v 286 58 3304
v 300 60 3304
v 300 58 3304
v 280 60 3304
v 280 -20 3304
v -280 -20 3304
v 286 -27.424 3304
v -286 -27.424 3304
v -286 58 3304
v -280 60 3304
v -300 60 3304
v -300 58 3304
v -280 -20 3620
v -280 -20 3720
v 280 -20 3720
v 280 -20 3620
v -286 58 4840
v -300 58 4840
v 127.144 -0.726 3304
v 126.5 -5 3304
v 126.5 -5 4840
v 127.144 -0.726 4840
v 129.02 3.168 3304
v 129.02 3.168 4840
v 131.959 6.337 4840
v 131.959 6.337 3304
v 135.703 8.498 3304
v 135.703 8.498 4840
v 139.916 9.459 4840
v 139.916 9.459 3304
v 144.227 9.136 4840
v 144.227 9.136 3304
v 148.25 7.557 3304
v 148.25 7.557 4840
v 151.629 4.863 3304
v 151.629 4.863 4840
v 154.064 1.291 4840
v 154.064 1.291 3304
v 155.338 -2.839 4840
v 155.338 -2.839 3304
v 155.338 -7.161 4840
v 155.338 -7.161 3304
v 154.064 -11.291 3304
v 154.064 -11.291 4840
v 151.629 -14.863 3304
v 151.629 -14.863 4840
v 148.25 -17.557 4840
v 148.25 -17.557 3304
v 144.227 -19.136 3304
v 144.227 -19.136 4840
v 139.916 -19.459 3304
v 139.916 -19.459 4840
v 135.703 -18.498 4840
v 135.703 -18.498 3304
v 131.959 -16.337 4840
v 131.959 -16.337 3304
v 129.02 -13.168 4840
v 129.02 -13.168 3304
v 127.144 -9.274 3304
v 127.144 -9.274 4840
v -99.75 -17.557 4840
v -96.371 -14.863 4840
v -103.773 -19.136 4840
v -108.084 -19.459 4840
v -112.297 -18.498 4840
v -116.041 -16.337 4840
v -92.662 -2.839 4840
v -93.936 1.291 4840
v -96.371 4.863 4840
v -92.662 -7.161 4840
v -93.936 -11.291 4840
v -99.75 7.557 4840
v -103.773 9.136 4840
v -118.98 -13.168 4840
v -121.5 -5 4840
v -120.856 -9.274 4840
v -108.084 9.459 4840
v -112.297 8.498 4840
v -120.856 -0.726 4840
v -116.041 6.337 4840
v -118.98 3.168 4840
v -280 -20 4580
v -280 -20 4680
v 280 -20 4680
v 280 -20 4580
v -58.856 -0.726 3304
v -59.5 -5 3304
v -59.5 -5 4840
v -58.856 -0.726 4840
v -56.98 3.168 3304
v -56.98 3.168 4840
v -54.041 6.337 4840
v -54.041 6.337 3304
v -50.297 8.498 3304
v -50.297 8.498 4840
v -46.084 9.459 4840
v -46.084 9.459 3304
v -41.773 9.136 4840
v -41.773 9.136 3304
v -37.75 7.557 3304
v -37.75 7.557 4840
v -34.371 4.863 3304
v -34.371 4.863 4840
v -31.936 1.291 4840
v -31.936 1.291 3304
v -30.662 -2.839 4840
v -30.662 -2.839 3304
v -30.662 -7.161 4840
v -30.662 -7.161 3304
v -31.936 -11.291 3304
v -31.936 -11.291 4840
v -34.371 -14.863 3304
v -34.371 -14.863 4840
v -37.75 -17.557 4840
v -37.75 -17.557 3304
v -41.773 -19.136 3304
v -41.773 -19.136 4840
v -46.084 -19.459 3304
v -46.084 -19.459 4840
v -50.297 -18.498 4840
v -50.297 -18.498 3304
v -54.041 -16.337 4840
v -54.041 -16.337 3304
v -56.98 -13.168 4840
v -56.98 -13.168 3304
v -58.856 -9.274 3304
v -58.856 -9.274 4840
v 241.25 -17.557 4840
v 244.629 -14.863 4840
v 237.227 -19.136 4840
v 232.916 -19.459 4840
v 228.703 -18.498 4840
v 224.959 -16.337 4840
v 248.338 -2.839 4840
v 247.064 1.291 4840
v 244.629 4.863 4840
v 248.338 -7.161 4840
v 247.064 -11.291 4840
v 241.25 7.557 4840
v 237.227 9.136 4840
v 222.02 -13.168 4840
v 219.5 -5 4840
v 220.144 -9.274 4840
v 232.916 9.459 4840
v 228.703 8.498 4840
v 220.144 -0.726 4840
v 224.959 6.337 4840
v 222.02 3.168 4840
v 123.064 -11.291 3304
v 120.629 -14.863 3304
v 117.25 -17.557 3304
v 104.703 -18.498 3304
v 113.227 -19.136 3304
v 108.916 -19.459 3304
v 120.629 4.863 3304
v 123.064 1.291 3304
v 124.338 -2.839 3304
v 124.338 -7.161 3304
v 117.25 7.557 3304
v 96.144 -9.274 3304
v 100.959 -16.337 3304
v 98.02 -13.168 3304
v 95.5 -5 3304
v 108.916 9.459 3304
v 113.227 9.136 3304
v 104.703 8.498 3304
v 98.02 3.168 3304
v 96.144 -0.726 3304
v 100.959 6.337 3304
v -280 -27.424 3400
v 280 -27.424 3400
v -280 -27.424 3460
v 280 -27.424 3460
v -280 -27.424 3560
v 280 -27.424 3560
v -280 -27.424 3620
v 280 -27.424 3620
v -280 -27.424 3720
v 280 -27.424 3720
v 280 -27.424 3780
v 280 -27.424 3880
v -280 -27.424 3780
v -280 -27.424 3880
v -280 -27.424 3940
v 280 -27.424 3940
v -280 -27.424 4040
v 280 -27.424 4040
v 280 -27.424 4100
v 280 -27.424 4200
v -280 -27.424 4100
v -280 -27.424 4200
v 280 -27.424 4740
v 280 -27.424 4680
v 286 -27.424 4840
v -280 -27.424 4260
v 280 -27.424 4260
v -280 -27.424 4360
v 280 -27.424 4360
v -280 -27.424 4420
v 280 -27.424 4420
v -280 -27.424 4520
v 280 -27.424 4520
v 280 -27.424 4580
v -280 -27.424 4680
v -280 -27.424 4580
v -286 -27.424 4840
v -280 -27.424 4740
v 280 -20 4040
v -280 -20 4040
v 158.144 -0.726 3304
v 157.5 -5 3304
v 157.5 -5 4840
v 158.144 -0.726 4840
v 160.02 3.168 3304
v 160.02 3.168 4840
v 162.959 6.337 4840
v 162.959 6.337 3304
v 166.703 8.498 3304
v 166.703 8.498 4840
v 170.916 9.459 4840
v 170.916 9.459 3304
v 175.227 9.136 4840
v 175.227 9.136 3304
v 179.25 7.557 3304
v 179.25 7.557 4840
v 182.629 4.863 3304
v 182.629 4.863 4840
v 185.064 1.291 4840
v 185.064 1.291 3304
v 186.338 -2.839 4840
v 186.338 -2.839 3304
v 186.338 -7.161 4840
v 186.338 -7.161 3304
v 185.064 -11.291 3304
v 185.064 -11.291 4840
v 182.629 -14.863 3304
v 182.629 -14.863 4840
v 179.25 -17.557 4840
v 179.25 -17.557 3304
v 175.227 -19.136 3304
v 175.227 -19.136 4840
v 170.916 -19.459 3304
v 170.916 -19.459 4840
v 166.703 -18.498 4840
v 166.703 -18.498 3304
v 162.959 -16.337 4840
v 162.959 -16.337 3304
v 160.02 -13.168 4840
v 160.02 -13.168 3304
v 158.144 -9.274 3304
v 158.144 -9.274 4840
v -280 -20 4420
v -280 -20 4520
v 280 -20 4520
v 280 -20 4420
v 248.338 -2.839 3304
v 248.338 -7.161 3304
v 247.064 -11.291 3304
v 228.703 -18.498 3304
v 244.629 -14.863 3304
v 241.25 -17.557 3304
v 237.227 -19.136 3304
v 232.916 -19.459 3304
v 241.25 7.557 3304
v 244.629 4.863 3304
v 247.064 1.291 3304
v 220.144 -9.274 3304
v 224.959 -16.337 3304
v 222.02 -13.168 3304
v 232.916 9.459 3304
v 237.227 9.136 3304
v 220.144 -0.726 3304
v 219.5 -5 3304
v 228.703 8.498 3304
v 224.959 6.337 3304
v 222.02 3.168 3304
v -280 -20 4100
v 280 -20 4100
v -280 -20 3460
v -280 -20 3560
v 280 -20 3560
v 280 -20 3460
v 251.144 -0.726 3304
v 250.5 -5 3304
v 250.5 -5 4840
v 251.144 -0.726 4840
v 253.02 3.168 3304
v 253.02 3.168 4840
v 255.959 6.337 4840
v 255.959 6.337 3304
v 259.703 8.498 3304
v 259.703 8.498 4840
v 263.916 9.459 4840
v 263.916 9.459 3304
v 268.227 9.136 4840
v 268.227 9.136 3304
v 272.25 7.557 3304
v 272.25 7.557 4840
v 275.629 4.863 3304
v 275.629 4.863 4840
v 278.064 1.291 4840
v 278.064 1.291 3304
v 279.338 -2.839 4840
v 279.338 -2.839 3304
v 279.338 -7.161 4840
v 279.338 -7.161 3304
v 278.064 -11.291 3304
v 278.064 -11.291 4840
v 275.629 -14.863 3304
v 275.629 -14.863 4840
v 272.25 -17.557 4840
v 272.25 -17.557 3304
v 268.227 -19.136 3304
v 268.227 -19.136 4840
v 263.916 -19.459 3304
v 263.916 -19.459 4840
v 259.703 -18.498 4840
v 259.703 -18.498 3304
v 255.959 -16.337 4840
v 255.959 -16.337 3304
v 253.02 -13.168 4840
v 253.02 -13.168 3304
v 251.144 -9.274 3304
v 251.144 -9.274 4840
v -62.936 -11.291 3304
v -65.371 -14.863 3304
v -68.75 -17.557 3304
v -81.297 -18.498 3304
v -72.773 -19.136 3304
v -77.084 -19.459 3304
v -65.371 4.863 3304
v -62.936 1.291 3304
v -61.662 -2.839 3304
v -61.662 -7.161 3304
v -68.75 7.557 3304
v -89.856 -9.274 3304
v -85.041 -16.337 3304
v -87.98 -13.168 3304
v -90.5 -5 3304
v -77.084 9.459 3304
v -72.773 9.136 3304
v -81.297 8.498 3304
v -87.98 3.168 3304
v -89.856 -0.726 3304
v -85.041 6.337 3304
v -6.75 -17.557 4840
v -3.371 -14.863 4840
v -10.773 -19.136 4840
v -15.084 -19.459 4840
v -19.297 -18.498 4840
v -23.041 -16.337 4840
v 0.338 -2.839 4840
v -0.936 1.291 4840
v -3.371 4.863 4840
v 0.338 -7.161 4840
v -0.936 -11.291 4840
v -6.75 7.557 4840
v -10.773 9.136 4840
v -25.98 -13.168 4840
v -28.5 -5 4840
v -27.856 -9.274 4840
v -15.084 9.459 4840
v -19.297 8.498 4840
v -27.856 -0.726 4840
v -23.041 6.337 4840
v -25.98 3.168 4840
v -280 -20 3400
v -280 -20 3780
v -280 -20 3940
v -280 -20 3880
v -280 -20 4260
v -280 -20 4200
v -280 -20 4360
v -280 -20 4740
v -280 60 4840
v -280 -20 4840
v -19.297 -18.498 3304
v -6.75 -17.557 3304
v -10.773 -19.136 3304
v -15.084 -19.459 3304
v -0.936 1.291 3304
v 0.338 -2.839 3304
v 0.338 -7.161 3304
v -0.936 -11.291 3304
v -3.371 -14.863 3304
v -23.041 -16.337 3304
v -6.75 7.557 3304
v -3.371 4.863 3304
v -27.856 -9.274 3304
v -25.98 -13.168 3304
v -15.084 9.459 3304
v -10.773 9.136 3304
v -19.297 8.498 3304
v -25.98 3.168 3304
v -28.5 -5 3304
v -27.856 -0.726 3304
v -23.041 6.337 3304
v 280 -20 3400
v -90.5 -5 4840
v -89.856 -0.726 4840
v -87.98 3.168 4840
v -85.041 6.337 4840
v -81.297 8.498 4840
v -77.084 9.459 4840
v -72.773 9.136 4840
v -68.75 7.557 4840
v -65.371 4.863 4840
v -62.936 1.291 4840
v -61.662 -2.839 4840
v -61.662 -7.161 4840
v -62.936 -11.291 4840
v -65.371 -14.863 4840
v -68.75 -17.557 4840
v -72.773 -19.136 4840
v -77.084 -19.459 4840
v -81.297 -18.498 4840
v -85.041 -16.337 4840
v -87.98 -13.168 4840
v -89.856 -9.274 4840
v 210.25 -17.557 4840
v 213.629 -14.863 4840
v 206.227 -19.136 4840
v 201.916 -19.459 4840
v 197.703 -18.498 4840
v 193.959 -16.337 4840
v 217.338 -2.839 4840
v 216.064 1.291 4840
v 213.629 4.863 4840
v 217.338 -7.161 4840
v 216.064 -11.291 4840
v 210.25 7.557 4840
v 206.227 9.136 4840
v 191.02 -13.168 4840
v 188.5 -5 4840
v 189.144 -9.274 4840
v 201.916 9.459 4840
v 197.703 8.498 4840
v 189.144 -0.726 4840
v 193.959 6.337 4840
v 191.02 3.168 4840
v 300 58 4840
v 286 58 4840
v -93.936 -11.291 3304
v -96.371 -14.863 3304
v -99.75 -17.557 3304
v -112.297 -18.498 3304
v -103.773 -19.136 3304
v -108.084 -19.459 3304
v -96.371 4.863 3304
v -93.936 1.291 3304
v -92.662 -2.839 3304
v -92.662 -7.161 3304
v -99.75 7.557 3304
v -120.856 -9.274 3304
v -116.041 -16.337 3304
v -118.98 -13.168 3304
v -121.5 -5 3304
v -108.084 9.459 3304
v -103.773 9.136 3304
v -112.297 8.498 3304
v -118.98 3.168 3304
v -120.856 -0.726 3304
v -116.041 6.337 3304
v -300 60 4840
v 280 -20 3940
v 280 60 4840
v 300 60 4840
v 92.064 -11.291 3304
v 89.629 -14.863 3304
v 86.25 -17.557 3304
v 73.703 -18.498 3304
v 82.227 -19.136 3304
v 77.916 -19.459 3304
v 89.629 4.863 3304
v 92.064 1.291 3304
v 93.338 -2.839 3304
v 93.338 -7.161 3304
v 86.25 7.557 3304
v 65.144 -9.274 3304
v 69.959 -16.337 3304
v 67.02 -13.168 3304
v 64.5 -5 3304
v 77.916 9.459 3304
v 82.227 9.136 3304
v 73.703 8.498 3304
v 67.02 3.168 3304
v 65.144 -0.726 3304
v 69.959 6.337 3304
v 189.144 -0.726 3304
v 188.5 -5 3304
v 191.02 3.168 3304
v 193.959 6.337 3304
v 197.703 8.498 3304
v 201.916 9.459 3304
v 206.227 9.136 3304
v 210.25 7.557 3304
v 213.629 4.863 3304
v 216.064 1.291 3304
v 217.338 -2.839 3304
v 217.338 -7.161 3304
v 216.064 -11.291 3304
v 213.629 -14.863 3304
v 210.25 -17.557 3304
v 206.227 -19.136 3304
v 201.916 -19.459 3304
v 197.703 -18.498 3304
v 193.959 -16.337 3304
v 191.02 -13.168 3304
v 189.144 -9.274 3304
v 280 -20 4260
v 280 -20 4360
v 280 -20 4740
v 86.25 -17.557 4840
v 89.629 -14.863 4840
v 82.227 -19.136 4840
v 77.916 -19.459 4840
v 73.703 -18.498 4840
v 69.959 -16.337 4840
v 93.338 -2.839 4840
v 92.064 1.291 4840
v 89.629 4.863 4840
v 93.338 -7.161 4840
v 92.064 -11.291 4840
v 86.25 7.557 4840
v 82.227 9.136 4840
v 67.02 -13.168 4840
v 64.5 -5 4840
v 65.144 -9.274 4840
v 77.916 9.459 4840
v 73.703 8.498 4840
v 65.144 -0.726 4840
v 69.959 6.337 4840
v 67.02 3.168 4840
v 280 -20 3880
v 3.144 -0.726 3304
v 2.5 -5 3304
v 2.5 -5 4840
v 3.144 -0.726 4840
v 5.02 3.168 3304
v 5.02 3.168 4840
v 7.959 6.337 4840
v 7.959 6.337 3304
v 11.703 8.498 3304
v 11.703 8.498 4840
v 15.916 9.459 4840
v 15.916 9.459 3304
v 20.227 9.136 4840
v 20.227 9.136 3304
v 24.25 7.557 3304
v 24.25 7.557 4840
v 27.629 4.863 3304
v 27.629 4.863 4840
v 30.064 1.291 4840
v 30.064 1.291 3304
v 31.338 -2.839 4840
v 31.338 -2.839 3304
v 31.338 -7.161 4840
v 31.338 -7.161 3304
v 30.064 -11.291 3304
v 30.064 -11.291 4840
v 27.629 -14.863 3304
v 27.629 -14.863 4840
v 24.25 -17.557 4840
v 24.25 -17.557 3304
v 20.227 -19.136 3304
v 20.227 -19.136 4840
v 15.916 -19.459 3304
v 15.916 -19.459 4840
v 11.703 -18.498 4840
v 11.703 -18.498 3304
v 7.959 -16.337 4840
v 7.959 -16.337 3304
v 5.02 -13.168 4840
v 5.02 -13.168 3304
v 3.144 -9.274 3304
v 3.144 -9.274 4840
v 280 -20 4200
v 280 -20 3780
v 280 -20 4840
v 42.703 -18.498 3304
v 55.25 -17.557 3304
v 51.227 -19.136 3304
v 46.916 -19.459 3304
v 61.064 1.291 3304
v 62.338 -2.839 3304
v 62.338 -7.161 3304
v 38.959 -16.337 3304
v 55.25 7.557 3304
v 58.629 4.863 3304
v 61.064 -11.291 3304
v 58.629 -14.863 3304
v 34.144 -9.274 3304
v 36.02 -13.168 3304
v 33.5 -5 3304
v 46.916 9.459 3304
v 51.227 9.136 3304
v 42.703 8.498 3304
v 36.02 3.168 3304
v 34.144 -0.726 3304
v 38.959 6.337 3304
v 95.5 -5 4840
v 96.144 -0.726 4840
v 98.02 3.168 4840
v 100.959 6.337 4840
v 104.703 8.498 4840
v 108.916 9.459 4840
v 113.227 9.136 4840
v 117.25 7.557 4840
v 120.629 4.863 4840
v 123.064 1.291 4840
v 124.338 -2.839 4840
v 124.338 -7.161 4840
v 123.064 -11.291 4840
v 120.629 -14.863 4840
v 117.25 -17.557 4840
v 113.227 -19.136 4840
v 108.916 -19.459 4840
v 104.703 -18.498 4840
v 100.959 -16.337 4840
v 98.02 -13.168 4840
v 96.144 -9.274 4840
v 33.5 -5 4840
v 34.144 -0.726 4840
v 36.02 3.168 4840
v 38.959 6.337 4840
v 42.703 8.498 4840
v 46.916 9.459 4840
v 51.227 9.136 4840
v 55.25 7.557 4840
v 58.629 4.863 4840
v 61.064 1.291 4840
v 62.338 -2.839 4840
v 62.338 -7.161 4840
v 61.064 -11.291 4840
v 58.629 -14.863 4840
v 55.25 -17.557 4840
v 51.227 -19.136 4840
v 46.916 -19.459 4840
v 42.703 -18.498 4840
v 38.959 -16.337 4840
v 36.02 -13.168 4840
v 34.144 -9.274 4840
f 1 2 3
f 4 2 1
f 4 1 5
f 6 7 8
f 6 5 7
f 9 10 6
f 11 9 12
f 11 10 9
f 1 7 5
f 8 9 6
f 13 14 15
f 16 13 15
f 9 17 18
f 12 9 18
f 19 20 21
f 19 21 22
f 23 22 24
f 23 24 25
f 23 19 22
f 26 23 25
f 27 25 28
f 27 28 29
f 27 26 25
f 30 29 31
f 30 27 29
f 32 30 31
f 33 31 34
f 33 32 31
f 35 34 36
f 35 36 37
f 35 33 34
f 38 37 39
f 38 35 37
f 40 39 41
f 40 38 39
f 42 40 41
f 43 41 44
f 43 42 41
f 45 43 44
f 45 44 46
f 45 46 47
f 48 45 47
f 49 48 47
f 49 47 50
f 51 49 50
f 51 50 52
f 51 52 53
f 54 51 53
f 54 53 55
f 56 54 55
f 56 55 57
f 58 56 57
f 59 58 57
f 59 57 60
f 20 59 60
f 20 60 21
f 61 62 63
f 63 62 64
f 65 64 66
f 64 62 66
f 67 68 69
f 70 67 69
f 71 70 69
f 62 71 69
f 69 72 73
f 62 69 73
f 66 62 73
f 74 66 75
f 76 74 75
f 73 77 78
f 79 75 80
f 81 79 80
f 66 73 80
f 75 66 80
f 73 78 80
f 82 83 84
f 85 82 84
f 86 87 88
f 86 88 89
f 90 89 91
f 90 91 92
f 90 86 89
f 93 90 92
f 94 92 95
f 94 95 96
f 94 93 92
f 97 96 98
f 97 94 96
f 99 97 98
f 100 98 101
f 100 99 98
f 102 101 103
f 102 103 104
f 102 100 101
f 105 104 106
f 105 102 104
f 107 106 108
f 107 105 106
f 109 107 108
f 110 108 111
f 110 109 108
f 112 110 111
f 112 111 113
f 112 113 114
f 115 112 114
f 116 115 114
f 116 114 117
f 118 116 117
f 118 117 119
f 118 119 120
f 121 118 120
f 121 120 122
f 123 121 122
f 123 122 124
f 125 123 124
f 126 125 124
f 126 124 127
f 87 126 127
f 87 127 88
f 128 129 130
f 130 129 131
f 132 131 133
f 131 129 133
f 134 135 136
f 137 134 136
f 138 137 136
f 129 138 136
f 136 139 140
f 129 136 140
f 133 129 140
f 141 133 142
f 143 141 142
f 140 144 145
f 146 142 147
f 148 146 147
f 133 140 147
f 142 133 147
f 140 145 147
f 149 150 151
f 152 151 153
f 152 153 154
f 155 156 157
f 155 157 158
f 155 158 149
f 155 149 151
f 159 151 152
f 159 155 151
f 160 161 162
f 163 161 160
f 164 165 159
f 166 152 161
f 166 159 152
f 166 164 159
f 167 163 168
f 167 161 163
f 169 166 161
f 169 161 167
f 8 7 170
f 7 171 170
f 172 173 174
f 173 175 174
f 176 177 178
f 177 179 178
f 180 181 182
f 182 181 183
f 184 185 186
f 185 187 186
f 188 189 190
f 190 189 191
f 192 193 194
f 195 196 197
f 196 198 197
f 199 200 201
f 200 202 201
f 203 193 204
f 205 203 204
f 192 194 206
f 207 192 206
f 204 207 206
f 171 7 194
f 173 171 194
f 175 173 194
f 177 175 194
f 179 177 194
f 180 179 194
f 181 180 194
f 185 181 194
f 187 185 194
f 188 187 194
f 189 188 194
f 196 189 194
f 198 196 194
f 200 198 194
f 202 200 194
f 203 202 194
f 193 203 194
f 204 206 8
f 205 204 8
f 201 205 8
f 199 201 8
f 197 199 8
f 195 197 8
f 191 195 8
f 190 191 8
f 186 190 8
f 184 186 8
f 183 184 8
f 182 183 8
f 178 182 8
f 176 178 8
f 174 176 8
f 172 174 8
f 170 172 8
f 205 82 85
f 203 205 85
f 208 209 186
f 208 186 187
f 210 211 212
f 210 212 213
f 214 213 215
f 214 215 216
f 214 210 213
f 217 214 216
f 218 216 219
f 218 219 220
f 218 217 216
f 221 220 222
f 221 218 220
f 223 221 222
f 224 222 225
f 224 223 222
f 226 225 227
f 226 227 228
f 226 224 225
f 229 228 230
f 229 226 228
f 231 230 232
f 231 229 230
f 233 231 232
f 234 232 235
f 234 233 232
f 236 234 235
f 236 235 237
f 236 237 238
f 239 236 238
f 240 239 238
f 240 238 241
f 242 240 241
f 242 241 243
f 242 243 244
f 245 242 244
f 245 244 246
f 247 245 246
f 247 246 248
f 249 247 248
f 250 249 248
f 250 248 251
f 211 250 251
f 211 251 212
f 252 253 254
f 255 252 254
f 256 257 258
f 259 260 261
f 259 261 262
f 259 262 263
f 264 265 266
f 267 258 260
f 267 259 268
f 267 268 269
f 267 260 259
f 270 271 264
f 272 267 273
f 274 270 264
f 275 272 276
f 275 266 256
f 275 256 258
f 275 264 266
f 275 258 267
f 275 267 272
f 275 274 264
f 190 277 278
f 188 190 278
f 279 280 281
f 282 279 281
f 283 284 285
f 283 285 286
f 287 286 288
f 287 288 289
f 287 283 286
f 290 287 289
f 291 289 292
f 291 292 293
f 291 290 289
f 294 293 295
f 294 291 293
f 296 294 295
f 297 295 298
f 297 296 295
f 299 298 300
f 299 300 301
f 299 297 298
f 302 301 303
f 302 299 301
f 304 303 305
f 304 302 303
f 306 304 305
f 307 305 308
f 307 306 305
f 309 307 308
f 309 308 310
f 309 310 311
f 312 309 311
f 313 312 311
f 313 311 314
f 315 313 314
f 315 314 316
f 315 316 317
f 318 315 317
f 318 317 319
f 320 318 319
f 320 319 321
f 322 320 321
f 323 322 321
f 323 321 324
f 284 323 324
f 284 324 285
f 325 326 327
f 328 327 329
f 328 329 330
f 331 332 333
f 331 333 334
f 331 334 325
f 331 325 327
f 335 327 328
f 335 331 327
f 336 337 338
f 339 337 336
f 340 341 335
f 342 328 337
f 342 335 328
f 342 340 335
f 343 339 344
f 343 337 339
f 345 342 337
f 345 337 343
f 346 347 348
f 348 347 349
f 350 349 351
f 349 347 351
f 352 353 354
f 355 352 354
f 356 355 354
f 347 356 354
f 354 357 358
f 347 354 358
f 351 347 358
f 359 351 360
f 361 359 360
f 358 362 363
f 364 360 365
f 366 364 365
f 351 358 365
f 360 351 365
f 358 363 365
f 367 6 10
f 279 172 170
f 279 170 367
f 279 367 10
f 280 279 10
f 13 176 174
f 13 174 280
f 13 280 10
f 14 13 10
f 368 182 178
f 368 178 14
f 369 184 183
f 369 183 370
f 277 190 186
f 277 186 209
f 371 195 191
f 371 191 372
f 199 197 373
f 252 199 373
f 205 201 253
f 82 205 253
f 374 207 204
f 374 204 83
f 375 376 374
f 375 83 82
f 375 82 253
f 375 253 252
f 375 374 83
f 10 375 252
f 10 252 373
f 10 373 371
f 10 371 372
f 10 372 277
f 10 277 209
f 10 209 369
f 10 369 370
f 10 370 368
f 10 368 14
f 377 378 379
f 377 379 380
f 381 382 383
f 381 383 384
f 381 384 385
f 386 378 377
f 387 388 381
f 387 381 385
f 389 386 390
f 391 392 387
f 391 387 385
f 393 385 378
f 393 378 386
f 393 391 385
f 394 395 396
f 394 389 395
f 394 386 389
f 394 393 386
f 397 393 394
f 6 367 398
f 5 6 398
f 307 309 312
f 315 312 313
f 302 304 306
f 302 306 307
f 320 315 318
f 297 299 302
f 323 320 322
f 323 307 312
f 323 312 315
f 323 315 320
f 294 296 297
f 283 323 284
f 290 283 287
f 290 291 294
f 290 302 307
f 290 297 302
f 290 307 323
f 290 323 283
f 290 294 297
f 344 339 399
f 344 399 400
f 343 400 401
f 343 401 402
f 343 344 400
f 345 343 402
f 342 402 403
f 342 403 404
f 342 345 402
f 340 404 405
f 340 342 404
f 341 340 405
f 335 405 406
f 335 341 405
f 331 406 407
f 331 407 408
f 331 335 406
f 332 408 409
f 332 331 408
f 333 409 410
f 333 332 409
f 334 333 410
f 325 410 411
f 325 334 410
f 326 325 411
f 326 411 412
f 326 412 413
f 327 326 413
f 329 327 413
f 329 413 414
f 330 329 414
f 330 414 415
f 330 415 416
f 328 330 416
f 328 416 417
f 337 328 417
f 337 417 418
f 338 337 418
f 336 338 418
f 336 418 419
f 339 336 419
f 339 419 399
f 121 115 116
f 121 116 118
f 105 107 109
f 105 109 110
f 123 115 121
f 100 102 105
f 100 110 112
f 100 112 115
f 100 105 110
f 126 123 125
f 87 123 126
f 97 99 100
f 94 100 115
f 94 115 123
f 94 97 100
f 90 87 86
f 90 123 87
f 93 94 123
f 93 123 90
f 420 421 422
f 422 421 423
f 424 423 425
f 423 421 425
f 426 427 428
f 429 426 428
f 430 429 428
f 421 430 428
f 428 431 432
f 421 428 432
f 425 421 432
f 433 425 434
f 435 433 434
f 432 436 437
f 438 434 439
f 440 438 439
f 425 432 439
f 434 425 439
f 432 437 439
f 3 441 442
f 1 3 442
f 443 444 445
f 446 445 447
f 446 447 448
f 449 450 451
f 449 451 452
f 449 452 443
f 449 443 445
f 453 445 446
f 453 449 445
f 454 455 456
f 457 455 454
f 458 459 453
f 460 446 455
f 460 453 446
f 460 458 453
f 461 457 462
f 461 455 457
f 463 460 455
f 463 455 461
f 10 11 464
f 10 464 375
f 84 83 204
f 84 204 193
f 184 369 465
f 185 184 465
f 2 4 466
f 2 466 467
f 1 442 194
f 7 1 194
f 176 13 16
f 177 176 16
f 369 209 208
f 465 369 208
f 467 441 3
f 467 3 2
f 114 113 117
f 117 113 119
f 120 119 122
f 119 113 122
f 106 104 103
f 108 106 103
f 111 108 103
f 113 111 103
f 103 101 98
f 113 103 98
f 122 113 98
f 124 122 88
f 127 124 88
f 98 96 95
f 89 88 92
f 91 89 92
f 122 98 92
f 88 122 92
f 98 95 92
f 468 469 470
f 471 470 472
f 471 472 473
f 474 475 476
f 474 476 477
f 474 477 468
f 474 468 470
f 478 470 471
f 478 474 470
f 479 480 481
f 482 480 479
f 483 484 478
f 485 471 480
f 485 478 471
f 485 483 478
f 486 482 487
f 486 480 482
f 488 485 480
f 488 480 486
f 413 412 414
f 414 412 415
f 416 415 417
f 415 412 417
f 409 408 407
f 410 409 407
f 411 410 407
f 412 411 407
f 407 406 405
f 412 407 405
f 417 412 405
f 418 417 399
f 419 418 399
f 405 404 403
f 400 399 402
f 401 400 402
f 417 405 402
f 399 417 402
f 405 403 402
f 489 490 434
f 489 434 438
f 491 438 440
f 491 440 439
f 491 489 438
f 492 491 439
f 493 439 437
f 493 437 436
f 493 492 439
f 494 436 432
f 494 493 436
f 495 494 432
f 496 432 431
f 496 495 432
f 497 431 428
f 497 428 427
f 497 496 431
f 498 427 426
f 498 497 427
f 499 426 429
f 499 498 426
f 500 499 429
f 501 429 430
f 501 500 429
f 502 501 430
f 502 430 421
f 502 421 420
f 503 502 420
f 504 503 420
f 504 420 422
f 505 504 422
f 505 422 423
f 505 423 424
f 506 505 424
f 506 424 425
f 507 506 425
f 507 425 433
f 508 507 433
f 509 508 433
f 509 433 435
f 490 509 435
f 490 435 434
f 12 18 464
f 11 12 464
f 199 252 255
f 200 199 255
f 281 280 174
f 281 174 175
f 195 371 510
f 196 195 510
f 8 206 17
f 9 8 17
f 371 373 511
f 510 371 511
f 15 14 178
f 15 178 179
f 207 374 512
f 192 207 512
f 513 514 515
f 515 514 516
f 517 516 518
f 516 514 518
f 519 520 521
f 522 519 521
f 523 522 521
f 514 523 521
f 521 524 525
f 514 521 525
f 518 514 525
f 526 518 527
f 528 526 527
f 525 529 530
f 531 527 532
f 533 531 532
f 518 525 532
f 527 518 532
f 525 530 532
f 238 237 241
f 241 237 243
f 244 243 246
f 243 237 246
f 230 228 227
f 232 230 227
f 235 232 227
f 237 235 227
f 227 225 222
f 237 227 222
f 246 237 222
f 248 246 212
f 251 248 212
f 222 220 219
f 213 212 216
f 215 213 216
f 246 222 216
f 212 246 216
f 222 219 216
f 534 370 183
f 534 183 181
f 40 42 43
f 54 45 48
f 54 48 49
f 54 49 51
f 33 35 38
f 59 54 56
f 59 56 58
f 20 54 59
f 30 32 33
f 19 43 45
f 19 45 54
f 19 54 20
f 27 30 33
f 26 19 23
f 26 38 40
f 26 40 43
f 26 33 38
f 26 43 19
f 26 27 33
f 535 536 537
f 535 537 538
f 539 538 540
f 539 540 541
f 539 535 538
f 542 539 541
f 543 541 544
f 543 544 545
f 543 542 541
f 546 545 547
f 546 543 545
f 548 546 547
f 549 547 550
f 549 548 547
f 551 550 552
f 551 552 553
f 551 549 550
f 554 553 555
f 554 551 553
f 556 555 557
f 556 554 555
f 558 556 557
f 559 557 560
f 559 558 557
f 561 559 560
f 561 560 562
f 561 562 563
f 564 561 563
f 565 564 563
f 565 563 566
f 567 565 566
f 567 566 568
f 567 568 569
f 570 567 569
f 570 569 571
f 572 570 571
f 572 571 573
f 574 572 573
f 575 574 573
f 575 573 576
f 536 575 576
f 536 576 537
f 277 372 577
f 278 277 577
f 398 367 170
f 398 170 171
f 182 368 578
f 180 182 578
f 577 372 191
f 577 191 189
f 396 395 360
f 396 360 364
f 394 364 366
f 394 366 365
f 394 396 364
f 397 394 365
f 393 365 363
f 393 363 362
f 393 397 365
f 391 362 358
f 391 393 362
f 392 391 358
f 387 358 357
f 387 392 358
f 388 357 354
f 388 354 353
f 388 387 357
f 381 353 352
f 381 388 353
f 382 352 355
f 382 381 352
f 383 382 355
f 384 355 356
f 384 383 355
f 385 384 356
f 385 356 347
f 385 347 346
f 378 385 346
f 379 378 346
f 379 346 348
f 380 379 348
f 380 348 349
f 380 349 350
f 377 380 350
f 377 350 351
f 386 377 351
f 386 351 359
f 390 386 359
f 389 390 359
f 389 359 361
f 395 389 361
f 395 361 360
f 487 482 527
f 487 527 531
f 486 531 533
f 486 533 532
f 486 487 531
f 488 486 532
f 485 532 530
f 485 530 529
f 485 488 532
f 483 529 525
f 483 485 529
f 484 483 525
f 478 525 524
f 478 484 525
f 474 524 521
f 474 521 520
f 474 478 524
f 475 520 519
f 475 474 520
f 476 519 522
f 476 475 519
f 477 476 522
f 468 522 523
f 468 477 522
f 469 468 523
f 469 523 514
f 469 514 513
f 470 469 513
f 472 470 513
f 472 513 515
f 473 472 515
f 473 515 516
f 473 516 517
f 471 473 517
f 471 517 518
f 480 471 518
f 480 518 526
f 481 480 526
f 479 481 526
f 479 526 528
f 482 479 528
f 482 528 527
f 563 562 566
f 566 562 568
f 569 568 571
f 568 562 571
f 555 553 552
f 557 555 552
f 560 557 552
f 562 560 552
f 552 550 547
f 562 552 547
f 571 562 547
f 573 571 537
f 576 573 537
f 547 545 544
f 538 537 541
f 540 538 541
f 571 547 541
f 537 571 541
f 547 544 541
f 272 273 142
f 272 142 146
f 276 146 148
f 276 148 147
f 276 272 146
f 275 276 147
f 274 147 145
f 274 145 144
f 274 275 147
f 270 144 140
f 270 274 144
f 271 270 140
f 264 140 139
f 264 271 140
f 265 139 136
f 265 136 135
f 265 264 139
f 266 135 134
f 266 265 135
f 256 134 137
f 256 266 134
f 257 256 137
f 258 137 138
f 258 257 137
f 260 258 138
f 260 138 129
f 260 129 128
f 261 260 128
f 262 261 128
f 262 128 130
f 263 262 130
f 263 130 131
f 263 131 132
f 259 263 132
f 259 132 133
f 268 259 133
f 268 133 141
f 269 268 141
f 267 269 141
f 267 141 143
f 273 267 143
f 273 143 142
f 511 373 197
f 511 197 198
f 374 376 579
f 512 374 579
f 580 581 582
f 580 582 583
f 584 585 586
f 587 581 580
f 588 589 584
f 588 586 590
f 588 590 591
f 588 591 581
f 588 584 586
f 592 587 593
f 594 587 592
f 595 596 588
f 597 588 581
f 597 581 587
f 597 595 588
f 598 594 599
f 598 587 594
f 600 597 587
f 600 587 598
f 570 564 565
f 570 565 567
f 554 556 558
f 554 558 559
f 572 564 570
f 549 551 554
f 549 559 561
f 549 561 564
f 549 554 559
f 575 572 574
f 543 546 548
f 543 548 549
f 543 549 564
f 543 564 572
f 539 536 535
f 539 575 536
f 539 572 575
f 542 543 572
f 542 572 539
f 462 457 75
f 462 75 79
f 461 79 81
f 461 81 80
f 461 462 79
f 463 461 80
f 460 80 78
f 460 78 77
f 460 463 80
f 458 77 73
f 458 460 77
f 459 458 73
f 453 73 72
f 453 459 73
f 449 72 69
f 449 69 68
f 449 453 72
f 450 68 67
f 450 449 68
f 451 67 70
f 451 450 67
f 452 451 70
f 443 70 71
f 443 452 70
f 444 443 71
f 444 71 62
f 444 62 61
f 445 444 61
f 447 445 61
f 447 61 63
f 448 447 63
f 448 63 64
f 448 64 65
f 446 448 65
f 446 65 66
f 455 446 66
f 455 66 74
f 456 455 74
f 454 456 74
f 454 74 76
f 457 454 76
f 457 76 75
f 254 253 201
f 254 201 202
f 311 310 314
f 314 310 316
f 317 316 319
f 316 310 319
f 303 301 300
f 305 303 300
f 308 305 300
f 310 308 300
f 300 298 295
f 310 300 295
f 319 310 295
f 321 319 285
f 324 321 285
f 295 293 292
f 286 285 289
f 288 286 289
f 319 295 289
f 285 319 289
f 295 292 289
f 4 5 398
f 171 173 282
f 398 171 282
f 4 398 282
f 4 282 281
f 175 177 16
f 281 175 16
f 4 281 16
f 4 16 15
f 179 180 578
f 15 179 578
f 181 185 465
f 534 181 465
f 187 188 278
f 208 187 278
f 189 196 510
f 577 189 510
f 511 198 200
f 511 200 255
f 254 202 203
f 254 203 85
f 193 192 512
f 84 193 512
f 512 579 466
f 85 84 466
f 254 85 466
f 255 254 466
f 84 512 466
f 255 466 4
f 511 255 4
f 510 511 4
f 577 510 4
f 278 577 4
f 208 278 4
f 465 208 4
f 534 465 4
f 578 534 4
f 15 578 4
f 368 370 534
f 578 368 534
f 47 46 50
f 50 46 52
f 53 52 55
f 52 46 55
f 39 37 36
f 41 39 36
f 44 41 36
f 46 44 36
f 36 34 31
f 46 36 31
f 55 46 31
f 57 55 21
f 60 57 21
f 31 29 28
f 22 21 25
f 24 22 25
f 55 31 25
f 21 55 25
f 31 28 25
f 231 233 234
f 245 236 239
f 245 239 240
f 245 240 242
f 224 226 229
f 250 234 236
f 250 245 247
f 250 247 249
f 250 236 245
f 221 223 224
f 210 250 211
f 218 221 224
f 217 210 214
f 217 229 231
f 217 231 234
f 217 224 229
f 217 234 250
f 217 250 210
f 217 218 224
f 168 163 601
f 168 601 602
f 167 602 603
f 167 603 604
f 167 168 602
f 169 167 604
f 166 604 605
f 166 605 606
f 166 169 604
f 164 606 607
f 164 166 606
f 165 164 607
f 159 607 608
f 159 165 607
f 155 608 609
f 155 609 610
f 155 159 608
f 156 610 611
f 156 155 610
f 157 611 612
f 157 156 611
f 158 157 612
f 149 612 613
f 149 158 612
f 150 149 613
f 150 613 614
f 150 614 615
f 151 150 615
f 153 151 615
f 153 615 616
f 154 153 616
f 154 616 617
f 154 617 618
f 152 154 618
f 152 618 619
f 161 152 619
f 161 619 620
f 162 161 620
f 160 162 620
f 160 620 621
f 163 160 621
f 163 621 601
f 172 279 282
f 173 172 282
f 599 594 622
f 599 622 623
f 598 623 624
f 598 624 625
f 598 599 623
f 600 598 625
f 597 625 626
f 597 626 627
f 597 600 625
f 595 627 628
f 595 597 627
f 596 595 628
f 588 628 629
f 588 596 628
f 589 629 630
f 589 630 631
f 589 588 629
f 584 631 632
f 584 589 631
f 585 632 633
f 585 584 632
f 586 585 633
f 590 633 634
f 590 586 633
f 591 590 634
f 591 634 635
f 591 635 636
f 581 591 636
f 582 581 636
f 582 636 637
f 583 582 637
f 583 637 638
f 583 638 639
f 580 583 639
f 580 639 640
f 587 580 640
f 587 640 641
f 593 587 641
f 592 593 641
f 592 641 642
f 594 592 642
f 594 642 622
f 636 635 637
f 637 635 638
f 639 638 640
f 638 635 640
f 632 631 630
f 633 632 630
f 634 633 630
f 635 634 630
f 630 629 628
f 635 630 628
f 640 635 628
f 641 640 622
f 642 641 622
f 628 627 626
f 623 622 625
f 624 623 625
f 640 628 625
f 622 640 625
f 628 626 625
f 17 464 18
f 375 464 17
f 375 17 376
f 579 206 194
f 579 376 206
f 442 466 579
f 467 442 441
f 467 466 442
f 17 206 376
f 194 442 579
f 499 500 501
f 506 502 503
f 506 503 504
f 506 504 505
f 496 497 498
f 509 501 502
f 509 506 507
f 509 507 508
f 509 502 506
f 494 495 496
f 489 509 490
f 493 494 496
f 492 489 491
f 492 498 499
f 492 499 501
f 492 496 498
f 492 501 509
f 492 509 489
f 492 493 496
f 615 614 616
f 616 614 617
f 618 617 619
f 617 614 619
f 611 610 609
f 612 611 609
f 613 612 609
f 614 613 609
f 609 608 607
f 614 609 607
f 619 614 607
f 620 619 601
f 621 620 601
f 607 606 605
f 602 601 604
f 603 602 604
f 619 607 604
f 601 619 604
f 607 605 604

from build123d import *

# Parameters (mm, degrees)
CROQUIS1_W              = 600
CROQUIS1_H              = 120
SALIENTE_EXTRUIR1_DEPTH = 4840
CROQUIS2_W              = 560
CROQUIS2_H              = 80
CORTAR_EXTRUIR1_DEPTH   = 4840
CORTAR_EXTRUIR2_DEPTH   = 4840
CROQUIS4_W              = 560
CROQUIS4_H              = 60
CORTAR_EXTRUIR3_DEPTH   = 4000
MATRIZL1_COUNT          = 30
MATRIZL1_PITCH          = 160
CROQUIS5_R              = 14.5
SALIENTE_EXTRUIR2_DEPTH = 4840
MATRIZL2_COUNT          = 13
MATRIZL2_PITCH          = 31
CROQUIS6_W              = 600
CROQUIS6_H              = 89.724233467
CORTAR_EXTRUIR4_DEPTH   = 3304


with BuildPart() as part:
    # Croquis1 → Saliente-Extruir1 (new body)
    with BuildSketch(Plane.XY):
        Rectangle(CROQUIS1_W, CROQUIS1_H)
    extrude(amount=SALIENTE_EXTRUIR1_DEPTH)

    # Croquis2 → Cortar-Extruir1 (cut)
    with BuildSketch(Plane.XY.offset(4840)):
        with Locations((0, 20)):
            Rectangle(CROQUIS2_W, CROQUIS2_H)
    extrude(amount=-CORTAR_EXTRUIR1_DEPTH, mode=Mode.SUBTRACT)

    # Croquis3 → Cortar-Extruir2 (cut)
    with BuildSketch(Plane.XY.offset(4840)):
        Polygon((-286, 58), (-300, 58), (-300, -60), (300, -60), (300, 58), (286, 58), (286, -27.423685892), (-286, -27.423685892), align=None)
    extrude(amount=-CORTAR_EXTRUIR2_DEPTH, mode=Mode.SUBTRACT)

    # Croquis4 → Cortar-Extruir3 (cut)
    with BuildSketch(Plane(origin=(0, -20, 0), x_dir=(1, 0, 0), z_dir=(0, 1, 0))):
        with Locations((0, -4710)):
            Rectangle(CROQUIS4_W, CROQUIS4_H)
    cortar_extruir3 = extrude(amount=-CORTAR_EXTRUIR3_DEPTH, mode=Mode.SUBTRACT)

    # MatrizL1: Cortar-Extruir3 ×30
    with Locations(*[(0, 0, -i * MATRIZL1_PITCH) for i in range(1, MATRIZL1_COUNT)]):
        add(cortar_extruir3, mode=Mode.SUBTRACT)


with BuildPart() as body_2:
    # Croquis5 → Saliente-Extruir2 (new body)
    with BuildSketch(Plane(origin=(0, 0, 0), x_dir=(-1, 0, 0), z_dir=(0, 0, -1))):
        with Locations((-265, -5)):
            Circle(CROQUIS5_R)
    saliente_extruir2 = extrude(amount=-SALIENTE_EXTRUIR2_DEPTH)


with BuildPart() as matrizl2_1:
    # MatrizL2: pattern copy
    add(saliente_extruir2.moved(Location(Vector(-1, 0, 0) * (1 * MATRIZL2_PITCH))))


with BuildPart() as matrizl2_2:
    # MatrizL2: pattern copy
    add(saliente_extruir2.moved(Location(Vector(-1, 0, 0) * (2 * MATRIZL2_PITCH))))


with BuildPart() as matrizl2_3:
    # MatrizL2: pattern copy
    add(saliente_extruir2.moved(Location(Vector(-1, 0, 0) * (3 * MATRIZL2_PITCH))))


with BuildPart() as matrizl2_4:
    # MatrizL2: pattern copy
    add(saliente_extruir2.moved(Location(Vector(-1, 0, 0) * (4 * MATRIZL2_PITCH))))


with BuildPart() as matrizl2_5:
    # MatrizL2: pattern copy
    add(saliente_extruir2.moved(Location(Vector(-1, 0, 0) * (5 * MATRIZL2_PITCH))))


with BuildPart() as matrizl2_6:
    # MatrizL2: pattern copy
    add(saliente_extruir2.moved(Location(Vector(-1, 0, 0) * (6 * MATRIZL2_PITCH))))


with BuildPart() as matrizl2_7:
    # MatrizL2: pattern copy
    add(saliente_extruir2.moved(Location(Vector(-1, 0, 0) * (7 * MATRIZL2_PITCH))))


with BuildPart() as matrizl2_8:
    # MatrizL2: pattern copy
    add(saliente_extruir2.moved(Location(Vector(-1, 0, 0) * (8 * MATRIZL2_PITCH))))


with BuildPart() as matrizl2_9:
    # MatrizL2: pattern copy
    add(saliente_extruir2.moved(Location(Vector(-1, 0, 0) * (9 * MATRIZL2_PITCH))))


with BuildPart() as matrizl2_10:
    # MatrizL2: pattern copy
    add(saliente_extruir2.moved(Location(Vector(-1, 0, 0) * (10 * MATRIZL2_PITCH))))


with BuildPart() as matrizl2_11:
    # MatrizL2: pattern copy
    add(saliente_extruir2.moved(Location(Vector(-1, 0, 0) * (11 * MATRIZL2_PITCH))))


with BuildPart() as matrizl2_12:
    # MatrizL2: pattern copy
    add(saliente_extruir2.moved(Location(Vector(-1, 0, 0) * (12 * MATRIZL2_PITCH))))


with BuildPart() as cortar_extruir4_tool:
    # Croquis6 → Cortar-Extruir4 (new body)
    with BuildSketch(Plane(origin=(0, 0, 0), x_dir=(-1, 0, 0), z_dir=(0, 0, -1))):
        with Locations((0, 15.137883267)):
            Rectangle(CROQUIS6_W, CROQUIS6_H)
    extrude(amount=-CORTAR_EXTRUIR4_DEPTH)


with BuildPart() as part_1:
    add(part.part)

    # Cortar-Extruir4: cut by cortar_extruir4_tool
    add(cortar_extruir4_tool.part, mode=Mode.SUBTRACT)


with BuildPart() as body_2_1:
    add(body_2.part)

    # Cortar-Extruir4: cut by cortar_extruir4_tool
    add(cortar_extruir4_tool.part, mode=Mode.SUBTRACT)


with BuildPart() as matrizl2_1_1:
    add(matrizl2_1.part)

    # Cortar-Extruir4: cut by cortar_extruir4_tool
    add(cortar_extruir4_tool.part, mode=Mode.SUBTRACT)


with BuildPart() as matrizl2_2_1:
    add(matrizl2_2.part)

    # Cortar-Extruir4: cut by cortar_extruir4_tool
    add(cortar_extruir4_tool.part, mode=Mode.SUBTRACT)


with BuildPart() as matrizl2_3_1:
    add(matrizl2_3.part)

    # Cortar-Extruir4: cut by cortar_extruir4_tool
    add(cortar_extruir4_tool.part, mode=Mode.SUBTRACT)


with BuildPart() as matrizl2_4_1:
    add(matrizl2_4.part)

    # Cortar-Extruir4: cut by cortar_extruir4_tool
    add(cortar_extruir4_tool.part, mode=Mode.SUBTRACT)


with BuildPart() as matrizl2_5_1:
    add(matrizl2_5.part)

    # Cortar-Extruir4: cut by cortar_extruir4_tool
    add(cortar_extruir4_tool.part, mode=Mode.SUBTRACT)


with BuildPart() as matrizl2_6_1:
    add(matrizl2_6.part)

    # Cortar-Extruir4: cut by cortar_extruir4_tool
    add(cortar_extruir4_tool.part, mode=Mode.SUBTRACT)


with BuildPart() as matrizl2_7_1:
    add(matrizl2_7.part)

    # Cortar-Extruir4: cut by cortar_extruir4_tool
    add(cortar_extruir4_tool.part, mode=Mode.SUBTRACT)


with BuildPart() as matrizl2_8_1:
    add(matrizl2_8.part)

    # Cortar-Extruir4: cut by cortar_extruir4_tool
    add(cortar_extruir4_tool.part, mode=Mode.SUBTRACT)


with BuildPart() as matrizl2_9_1:
    add(matrizl2_9.part)

    # Cortar-Extruir4: cut by cortar_extruir4_tool
    add(cortar_extruir4_tool.part, mode=Mode.SUBTRACT)


with BuildPart() as matrizl2_10_1:
    add(matrizl2_10.part)

    # Cortar-Extruir4: cut by cortar_extruir4_tool
    add(cortar_extruir4_tool.part, mode=Mode.SUBTRACT)


with BuildPart() as matrizl2_11_1:
    add(matrizl2_11.part)

    # Cortar-Extruir4: cut by cortar_extruir4_tool
    add(cortar_extruir4_tool.part, mode=Mode.SUBTRACT)


with BuildPart() as matrizl2_12_1:
    add(matrizl2_12.part)

    # Cortar-Extruir4: cut by cortar_extruir4_tool
    add(cortar_extruir4_tool.part, mode=Mode.SUBTRACT)


solid = Compound([part_1.part, body_2_1.part, matrizl2_1_1.part, matrizl2_2_1.part, matrizl2_3_1.part, matrizl2_4_1.part, matrizl2_5_1.part, matrizl2_6_1.part, matrizl2_7_1.part, matrizl2_8_1.part, matrizl2_9_1.part, matrizl2_10_1.part, matrizl2_11_1.part, matrizl2_12_1.part])
